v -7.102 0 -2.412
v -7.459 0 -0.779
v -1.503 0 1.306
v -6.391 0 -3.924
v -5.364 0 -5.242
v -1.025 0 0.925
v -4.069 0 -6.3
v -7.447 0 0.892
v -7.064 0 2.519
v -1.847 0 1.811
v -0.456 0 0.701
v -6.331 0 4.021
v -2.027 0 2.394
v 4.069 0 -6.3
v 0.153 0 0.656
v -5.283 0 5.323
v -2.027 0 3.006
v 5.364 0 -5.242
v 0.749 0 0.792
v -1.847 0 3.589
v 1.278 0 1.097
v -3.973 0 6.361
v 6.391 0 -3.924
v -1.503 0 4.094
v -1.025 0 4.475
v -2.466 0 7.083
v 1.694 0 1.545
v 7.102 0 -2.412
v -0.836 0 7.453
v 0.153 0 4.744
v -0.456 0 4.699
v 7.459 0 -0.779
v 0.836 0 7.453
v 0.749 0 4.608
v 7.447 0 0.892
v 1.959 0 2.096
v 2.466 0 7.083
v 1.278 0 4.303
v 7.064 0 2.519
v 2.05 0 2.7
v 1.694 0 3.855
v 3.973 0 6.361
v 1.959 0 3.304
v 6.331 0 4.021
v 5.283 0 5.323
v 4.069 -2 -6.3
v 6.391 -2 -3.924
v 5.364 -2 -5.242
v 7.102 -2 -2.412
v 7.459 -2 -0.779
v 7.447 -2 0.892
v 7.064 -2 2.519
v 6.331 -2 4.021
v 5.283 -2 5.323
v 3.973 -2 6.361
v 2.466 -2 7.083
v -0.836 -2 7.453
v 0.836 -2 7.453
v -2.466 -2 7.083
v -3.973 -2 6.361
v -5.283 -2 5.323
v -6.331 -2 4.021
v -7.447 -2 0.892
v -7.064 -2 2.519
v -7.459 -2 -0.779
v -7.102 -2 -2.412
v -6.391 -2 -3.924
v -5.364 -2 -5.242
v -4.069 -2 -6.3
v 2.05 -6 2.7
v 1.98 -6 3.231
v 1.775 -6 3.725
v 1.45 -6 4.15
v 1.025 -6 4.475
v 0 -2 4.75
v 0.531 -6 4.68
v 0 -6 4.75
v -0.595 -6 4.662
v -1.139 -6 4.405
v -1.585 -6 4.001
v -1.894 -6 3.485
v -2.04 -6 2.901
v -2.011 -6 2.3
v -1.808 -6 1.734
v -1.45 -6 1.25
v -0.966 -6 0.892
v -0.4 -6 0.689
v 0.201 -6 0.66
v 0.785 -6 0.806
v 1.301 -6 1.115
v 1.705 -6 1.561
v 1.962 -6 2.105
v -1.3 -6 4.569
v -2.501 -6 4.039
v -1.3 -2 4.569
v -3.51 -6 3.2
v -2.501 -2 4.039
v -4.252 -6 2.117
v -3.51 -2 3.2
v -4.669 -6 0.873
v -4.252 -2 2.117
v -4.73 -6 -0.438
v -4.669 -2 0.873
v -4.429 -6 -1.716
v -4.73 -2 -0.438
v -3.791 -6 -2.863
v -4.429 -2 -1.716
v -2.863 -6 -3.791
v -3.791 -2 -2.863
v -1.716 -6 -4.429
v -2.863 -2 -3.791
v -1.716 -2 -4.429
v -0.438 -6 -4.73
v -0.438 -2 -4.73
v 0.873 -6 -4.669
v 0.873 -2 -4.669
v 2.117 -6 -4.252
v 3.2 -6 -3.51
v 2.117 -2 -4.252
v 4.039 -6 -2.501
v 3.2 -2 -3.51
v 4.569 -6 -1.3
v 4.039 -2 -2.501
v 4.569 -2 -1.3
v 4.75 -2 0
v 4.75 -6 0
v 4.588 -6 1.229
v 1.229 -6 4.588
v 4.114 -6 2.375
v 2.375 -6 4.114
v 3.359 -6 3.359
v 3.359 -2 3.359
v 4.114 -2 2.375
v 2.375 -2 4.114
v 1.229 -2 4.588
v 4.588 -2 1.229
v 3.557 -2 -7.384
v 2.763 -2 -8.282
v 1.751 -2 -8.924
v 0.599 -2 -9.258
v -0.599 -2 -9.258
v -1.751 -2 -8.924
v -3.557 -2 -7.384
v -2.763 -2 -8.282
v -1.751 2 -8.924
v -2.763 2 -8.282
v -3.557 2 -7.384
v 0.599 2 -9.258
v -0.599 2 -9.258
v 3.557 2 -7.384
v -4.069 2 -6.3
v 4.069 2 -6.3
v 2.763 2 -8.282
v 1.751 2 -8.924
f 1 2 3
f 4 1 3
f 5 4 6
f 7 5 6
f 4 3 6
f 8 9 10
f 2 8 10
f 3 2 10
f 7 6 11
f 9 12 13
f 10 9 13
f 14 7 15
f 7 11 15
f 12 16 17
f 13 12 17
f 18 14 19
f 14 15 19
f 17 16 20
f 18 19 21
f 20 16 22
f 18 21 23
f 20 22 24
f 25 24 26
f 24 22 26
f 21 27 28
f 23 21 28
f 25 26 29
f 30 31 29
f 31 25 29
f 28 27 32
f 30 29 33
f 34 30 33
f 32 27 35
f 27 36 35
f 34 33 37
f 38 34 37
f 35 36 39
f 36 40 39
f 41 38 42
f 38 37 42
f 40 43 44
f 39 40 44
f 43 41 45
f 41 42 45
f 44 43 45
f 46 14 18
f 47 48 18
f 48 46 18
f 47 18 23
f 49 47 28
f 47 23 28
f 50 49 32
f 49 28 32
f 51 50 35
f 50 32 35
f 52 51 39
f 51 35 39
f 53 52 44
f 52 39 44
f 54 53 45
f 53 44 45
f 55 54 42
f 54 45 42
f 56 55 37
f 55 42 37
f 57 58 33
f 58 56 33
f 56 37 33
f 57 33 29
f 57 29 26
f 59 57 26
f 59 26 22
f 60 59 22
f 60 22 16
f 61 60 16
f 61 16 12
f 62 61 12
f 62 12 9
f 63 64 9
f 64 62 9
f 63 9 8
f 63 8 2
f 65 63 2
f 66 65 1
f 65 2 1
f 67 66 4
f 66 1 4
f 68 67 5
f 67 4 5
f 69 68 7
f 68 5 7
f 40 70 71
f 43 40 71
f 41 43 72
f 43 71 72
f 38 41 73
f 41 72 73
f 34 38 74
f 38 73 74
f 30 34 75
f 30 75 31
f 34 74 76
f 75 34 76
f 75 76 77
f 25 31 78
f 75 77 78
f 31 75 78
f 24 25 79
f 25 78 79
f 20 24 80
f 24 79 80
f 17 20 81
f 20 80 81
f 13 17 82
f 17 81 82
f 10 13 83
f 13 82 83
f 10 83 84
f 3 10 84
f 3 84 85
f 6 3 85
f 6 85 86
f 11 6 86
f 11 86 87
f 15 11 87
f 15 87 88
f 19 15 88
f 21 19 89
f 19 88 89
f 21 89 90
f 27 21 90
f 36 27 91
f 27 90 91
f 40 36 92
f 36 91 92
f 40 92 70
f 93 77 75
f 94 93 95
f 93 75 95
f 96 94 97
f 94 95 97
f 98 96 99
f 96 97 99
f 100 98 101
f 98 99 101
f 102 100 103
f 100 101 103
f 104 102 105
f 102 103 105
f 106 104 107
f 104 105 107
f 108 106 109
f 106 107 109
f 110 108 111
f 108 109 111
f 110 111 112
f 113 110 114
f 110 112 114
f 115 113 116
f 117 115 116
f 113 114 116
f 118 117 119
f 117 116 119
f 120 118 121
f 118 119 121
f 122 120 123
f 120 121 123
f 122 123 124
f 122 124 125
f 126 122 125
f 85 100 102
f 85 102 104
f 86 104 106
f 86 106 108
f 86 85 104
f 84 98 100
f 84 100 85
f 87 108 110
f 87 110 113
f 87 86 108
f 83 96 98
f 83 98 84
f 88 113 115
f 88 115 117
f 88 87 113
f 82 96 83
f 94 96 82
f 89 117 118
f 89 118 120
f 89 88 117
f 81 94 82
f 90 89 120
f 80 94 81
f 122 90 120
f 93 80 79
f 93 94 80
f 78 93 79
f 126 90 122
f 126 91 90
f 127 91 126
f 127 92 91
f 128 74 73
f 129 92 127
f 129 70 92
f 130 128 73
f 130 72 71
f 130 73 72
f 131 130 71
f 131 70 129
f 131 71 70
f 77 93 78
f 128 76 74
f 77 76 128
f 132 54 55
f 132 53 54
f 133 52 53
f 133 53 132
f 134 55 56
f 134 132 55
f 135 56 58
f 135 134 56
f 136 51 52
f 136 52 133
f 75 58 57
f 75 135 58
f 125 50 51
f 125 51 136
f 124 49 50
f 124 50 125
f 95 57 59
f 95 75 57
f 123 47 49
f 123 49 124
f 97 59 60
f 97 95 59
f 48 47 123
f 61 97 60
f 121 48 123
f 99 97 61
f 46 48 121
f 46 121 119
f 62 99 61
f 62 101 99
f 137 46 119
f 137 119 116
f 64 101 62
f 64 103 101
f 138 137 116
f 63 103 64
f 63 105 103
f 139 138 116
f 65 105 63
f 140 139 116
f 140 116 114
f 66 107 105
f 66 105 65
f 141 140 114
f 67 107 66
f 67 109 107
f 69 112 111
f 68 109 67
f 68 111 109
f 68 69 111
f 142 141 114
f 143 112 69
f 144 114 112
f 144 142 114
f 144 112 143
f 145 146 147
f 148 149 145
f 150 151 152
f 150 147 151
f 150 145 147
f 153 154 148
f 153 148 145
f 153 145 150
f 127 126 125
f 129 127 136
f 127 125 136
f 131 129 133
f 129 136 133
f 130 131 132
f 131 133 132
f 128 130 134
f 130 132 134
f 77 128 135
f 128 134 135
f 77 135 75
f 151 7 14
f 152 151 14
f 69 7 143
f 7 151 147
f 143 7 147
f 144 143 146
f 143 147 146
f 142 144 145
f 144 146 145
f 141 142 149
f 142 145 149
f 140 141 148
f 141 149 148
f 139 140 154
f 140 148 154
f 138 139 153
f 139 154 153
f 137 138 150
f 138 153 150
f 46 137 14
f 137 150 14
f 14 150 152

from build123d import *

# Parameters (mm, degrees)
SKETCH_R     = 7.5
PAD_DEPTH    = 2
SKETCH001_R  = 4.75
PAD001_DEPTH = 4
SKETCH002_R  = 2.05
POCKET_DEPTH = 6
PAD002_DEPTH = 2
PAD003_DEPTH = 2


with BuildPart() as part:
    # Sketch → Pad (new body)
    with BuildSketch(Plane.XZ):
        Circle(SKETCH_R)
    extrude(amount=PAD_DEPTH)

    # Sketch001 (on Face3 of Pad) → Pad001 (join)
    with BuildSketch(Plane.XZ.offset(2)):
        Circle(SKETCH001_R)
    extrude(amount=PAD001_DEPTH)

    # Sketch002 (on Face5 of Pad001) → Pocket (cut)
    with BuildSketch(Plane.XZ.offset(6)):
        with Locations((0, 2.7)):
            Circle(SKETCH002_R)
    extrude(amount=-POCKET_DEPTH, mode=Mode.SUBTRACT)

    # Sketch003 (on Face2 of Pocket) → Pad002 (join)
    with BuildSketch(Plane(origin=(0, 0, 0), x_dir=(1, 0, 0), z_dir=(0, 1, 0))):
        with BuildLine():
            Line((-4.069398, 6.3), (4.069398, 6.3))
            ThreePointArc((4.069398, 6.3), (0, 9.3), (-4.069398, 6.3))
        make_face()
    extrude(amount=PAD002_DEPTH)

    # Pad002 Face3 → Pad003 (add)
    with BuildSketch(Plane(origin=(0, 0, -7.992176), x_dir=(-1, 0, 0), z_dir=(0, -1, 0))):
        with BuildLine():
            ThreePointArc((4.069398, -1.692176), (0, 1.307824), (-4.069398, -1.692176))
            ThreePointArc((-4.069398, -1.692176), (0, -0.492176), (4.069398, -1.692176))
        make_face()
    extrude(amount=PAD003_DEPTH)


solid = part.part
